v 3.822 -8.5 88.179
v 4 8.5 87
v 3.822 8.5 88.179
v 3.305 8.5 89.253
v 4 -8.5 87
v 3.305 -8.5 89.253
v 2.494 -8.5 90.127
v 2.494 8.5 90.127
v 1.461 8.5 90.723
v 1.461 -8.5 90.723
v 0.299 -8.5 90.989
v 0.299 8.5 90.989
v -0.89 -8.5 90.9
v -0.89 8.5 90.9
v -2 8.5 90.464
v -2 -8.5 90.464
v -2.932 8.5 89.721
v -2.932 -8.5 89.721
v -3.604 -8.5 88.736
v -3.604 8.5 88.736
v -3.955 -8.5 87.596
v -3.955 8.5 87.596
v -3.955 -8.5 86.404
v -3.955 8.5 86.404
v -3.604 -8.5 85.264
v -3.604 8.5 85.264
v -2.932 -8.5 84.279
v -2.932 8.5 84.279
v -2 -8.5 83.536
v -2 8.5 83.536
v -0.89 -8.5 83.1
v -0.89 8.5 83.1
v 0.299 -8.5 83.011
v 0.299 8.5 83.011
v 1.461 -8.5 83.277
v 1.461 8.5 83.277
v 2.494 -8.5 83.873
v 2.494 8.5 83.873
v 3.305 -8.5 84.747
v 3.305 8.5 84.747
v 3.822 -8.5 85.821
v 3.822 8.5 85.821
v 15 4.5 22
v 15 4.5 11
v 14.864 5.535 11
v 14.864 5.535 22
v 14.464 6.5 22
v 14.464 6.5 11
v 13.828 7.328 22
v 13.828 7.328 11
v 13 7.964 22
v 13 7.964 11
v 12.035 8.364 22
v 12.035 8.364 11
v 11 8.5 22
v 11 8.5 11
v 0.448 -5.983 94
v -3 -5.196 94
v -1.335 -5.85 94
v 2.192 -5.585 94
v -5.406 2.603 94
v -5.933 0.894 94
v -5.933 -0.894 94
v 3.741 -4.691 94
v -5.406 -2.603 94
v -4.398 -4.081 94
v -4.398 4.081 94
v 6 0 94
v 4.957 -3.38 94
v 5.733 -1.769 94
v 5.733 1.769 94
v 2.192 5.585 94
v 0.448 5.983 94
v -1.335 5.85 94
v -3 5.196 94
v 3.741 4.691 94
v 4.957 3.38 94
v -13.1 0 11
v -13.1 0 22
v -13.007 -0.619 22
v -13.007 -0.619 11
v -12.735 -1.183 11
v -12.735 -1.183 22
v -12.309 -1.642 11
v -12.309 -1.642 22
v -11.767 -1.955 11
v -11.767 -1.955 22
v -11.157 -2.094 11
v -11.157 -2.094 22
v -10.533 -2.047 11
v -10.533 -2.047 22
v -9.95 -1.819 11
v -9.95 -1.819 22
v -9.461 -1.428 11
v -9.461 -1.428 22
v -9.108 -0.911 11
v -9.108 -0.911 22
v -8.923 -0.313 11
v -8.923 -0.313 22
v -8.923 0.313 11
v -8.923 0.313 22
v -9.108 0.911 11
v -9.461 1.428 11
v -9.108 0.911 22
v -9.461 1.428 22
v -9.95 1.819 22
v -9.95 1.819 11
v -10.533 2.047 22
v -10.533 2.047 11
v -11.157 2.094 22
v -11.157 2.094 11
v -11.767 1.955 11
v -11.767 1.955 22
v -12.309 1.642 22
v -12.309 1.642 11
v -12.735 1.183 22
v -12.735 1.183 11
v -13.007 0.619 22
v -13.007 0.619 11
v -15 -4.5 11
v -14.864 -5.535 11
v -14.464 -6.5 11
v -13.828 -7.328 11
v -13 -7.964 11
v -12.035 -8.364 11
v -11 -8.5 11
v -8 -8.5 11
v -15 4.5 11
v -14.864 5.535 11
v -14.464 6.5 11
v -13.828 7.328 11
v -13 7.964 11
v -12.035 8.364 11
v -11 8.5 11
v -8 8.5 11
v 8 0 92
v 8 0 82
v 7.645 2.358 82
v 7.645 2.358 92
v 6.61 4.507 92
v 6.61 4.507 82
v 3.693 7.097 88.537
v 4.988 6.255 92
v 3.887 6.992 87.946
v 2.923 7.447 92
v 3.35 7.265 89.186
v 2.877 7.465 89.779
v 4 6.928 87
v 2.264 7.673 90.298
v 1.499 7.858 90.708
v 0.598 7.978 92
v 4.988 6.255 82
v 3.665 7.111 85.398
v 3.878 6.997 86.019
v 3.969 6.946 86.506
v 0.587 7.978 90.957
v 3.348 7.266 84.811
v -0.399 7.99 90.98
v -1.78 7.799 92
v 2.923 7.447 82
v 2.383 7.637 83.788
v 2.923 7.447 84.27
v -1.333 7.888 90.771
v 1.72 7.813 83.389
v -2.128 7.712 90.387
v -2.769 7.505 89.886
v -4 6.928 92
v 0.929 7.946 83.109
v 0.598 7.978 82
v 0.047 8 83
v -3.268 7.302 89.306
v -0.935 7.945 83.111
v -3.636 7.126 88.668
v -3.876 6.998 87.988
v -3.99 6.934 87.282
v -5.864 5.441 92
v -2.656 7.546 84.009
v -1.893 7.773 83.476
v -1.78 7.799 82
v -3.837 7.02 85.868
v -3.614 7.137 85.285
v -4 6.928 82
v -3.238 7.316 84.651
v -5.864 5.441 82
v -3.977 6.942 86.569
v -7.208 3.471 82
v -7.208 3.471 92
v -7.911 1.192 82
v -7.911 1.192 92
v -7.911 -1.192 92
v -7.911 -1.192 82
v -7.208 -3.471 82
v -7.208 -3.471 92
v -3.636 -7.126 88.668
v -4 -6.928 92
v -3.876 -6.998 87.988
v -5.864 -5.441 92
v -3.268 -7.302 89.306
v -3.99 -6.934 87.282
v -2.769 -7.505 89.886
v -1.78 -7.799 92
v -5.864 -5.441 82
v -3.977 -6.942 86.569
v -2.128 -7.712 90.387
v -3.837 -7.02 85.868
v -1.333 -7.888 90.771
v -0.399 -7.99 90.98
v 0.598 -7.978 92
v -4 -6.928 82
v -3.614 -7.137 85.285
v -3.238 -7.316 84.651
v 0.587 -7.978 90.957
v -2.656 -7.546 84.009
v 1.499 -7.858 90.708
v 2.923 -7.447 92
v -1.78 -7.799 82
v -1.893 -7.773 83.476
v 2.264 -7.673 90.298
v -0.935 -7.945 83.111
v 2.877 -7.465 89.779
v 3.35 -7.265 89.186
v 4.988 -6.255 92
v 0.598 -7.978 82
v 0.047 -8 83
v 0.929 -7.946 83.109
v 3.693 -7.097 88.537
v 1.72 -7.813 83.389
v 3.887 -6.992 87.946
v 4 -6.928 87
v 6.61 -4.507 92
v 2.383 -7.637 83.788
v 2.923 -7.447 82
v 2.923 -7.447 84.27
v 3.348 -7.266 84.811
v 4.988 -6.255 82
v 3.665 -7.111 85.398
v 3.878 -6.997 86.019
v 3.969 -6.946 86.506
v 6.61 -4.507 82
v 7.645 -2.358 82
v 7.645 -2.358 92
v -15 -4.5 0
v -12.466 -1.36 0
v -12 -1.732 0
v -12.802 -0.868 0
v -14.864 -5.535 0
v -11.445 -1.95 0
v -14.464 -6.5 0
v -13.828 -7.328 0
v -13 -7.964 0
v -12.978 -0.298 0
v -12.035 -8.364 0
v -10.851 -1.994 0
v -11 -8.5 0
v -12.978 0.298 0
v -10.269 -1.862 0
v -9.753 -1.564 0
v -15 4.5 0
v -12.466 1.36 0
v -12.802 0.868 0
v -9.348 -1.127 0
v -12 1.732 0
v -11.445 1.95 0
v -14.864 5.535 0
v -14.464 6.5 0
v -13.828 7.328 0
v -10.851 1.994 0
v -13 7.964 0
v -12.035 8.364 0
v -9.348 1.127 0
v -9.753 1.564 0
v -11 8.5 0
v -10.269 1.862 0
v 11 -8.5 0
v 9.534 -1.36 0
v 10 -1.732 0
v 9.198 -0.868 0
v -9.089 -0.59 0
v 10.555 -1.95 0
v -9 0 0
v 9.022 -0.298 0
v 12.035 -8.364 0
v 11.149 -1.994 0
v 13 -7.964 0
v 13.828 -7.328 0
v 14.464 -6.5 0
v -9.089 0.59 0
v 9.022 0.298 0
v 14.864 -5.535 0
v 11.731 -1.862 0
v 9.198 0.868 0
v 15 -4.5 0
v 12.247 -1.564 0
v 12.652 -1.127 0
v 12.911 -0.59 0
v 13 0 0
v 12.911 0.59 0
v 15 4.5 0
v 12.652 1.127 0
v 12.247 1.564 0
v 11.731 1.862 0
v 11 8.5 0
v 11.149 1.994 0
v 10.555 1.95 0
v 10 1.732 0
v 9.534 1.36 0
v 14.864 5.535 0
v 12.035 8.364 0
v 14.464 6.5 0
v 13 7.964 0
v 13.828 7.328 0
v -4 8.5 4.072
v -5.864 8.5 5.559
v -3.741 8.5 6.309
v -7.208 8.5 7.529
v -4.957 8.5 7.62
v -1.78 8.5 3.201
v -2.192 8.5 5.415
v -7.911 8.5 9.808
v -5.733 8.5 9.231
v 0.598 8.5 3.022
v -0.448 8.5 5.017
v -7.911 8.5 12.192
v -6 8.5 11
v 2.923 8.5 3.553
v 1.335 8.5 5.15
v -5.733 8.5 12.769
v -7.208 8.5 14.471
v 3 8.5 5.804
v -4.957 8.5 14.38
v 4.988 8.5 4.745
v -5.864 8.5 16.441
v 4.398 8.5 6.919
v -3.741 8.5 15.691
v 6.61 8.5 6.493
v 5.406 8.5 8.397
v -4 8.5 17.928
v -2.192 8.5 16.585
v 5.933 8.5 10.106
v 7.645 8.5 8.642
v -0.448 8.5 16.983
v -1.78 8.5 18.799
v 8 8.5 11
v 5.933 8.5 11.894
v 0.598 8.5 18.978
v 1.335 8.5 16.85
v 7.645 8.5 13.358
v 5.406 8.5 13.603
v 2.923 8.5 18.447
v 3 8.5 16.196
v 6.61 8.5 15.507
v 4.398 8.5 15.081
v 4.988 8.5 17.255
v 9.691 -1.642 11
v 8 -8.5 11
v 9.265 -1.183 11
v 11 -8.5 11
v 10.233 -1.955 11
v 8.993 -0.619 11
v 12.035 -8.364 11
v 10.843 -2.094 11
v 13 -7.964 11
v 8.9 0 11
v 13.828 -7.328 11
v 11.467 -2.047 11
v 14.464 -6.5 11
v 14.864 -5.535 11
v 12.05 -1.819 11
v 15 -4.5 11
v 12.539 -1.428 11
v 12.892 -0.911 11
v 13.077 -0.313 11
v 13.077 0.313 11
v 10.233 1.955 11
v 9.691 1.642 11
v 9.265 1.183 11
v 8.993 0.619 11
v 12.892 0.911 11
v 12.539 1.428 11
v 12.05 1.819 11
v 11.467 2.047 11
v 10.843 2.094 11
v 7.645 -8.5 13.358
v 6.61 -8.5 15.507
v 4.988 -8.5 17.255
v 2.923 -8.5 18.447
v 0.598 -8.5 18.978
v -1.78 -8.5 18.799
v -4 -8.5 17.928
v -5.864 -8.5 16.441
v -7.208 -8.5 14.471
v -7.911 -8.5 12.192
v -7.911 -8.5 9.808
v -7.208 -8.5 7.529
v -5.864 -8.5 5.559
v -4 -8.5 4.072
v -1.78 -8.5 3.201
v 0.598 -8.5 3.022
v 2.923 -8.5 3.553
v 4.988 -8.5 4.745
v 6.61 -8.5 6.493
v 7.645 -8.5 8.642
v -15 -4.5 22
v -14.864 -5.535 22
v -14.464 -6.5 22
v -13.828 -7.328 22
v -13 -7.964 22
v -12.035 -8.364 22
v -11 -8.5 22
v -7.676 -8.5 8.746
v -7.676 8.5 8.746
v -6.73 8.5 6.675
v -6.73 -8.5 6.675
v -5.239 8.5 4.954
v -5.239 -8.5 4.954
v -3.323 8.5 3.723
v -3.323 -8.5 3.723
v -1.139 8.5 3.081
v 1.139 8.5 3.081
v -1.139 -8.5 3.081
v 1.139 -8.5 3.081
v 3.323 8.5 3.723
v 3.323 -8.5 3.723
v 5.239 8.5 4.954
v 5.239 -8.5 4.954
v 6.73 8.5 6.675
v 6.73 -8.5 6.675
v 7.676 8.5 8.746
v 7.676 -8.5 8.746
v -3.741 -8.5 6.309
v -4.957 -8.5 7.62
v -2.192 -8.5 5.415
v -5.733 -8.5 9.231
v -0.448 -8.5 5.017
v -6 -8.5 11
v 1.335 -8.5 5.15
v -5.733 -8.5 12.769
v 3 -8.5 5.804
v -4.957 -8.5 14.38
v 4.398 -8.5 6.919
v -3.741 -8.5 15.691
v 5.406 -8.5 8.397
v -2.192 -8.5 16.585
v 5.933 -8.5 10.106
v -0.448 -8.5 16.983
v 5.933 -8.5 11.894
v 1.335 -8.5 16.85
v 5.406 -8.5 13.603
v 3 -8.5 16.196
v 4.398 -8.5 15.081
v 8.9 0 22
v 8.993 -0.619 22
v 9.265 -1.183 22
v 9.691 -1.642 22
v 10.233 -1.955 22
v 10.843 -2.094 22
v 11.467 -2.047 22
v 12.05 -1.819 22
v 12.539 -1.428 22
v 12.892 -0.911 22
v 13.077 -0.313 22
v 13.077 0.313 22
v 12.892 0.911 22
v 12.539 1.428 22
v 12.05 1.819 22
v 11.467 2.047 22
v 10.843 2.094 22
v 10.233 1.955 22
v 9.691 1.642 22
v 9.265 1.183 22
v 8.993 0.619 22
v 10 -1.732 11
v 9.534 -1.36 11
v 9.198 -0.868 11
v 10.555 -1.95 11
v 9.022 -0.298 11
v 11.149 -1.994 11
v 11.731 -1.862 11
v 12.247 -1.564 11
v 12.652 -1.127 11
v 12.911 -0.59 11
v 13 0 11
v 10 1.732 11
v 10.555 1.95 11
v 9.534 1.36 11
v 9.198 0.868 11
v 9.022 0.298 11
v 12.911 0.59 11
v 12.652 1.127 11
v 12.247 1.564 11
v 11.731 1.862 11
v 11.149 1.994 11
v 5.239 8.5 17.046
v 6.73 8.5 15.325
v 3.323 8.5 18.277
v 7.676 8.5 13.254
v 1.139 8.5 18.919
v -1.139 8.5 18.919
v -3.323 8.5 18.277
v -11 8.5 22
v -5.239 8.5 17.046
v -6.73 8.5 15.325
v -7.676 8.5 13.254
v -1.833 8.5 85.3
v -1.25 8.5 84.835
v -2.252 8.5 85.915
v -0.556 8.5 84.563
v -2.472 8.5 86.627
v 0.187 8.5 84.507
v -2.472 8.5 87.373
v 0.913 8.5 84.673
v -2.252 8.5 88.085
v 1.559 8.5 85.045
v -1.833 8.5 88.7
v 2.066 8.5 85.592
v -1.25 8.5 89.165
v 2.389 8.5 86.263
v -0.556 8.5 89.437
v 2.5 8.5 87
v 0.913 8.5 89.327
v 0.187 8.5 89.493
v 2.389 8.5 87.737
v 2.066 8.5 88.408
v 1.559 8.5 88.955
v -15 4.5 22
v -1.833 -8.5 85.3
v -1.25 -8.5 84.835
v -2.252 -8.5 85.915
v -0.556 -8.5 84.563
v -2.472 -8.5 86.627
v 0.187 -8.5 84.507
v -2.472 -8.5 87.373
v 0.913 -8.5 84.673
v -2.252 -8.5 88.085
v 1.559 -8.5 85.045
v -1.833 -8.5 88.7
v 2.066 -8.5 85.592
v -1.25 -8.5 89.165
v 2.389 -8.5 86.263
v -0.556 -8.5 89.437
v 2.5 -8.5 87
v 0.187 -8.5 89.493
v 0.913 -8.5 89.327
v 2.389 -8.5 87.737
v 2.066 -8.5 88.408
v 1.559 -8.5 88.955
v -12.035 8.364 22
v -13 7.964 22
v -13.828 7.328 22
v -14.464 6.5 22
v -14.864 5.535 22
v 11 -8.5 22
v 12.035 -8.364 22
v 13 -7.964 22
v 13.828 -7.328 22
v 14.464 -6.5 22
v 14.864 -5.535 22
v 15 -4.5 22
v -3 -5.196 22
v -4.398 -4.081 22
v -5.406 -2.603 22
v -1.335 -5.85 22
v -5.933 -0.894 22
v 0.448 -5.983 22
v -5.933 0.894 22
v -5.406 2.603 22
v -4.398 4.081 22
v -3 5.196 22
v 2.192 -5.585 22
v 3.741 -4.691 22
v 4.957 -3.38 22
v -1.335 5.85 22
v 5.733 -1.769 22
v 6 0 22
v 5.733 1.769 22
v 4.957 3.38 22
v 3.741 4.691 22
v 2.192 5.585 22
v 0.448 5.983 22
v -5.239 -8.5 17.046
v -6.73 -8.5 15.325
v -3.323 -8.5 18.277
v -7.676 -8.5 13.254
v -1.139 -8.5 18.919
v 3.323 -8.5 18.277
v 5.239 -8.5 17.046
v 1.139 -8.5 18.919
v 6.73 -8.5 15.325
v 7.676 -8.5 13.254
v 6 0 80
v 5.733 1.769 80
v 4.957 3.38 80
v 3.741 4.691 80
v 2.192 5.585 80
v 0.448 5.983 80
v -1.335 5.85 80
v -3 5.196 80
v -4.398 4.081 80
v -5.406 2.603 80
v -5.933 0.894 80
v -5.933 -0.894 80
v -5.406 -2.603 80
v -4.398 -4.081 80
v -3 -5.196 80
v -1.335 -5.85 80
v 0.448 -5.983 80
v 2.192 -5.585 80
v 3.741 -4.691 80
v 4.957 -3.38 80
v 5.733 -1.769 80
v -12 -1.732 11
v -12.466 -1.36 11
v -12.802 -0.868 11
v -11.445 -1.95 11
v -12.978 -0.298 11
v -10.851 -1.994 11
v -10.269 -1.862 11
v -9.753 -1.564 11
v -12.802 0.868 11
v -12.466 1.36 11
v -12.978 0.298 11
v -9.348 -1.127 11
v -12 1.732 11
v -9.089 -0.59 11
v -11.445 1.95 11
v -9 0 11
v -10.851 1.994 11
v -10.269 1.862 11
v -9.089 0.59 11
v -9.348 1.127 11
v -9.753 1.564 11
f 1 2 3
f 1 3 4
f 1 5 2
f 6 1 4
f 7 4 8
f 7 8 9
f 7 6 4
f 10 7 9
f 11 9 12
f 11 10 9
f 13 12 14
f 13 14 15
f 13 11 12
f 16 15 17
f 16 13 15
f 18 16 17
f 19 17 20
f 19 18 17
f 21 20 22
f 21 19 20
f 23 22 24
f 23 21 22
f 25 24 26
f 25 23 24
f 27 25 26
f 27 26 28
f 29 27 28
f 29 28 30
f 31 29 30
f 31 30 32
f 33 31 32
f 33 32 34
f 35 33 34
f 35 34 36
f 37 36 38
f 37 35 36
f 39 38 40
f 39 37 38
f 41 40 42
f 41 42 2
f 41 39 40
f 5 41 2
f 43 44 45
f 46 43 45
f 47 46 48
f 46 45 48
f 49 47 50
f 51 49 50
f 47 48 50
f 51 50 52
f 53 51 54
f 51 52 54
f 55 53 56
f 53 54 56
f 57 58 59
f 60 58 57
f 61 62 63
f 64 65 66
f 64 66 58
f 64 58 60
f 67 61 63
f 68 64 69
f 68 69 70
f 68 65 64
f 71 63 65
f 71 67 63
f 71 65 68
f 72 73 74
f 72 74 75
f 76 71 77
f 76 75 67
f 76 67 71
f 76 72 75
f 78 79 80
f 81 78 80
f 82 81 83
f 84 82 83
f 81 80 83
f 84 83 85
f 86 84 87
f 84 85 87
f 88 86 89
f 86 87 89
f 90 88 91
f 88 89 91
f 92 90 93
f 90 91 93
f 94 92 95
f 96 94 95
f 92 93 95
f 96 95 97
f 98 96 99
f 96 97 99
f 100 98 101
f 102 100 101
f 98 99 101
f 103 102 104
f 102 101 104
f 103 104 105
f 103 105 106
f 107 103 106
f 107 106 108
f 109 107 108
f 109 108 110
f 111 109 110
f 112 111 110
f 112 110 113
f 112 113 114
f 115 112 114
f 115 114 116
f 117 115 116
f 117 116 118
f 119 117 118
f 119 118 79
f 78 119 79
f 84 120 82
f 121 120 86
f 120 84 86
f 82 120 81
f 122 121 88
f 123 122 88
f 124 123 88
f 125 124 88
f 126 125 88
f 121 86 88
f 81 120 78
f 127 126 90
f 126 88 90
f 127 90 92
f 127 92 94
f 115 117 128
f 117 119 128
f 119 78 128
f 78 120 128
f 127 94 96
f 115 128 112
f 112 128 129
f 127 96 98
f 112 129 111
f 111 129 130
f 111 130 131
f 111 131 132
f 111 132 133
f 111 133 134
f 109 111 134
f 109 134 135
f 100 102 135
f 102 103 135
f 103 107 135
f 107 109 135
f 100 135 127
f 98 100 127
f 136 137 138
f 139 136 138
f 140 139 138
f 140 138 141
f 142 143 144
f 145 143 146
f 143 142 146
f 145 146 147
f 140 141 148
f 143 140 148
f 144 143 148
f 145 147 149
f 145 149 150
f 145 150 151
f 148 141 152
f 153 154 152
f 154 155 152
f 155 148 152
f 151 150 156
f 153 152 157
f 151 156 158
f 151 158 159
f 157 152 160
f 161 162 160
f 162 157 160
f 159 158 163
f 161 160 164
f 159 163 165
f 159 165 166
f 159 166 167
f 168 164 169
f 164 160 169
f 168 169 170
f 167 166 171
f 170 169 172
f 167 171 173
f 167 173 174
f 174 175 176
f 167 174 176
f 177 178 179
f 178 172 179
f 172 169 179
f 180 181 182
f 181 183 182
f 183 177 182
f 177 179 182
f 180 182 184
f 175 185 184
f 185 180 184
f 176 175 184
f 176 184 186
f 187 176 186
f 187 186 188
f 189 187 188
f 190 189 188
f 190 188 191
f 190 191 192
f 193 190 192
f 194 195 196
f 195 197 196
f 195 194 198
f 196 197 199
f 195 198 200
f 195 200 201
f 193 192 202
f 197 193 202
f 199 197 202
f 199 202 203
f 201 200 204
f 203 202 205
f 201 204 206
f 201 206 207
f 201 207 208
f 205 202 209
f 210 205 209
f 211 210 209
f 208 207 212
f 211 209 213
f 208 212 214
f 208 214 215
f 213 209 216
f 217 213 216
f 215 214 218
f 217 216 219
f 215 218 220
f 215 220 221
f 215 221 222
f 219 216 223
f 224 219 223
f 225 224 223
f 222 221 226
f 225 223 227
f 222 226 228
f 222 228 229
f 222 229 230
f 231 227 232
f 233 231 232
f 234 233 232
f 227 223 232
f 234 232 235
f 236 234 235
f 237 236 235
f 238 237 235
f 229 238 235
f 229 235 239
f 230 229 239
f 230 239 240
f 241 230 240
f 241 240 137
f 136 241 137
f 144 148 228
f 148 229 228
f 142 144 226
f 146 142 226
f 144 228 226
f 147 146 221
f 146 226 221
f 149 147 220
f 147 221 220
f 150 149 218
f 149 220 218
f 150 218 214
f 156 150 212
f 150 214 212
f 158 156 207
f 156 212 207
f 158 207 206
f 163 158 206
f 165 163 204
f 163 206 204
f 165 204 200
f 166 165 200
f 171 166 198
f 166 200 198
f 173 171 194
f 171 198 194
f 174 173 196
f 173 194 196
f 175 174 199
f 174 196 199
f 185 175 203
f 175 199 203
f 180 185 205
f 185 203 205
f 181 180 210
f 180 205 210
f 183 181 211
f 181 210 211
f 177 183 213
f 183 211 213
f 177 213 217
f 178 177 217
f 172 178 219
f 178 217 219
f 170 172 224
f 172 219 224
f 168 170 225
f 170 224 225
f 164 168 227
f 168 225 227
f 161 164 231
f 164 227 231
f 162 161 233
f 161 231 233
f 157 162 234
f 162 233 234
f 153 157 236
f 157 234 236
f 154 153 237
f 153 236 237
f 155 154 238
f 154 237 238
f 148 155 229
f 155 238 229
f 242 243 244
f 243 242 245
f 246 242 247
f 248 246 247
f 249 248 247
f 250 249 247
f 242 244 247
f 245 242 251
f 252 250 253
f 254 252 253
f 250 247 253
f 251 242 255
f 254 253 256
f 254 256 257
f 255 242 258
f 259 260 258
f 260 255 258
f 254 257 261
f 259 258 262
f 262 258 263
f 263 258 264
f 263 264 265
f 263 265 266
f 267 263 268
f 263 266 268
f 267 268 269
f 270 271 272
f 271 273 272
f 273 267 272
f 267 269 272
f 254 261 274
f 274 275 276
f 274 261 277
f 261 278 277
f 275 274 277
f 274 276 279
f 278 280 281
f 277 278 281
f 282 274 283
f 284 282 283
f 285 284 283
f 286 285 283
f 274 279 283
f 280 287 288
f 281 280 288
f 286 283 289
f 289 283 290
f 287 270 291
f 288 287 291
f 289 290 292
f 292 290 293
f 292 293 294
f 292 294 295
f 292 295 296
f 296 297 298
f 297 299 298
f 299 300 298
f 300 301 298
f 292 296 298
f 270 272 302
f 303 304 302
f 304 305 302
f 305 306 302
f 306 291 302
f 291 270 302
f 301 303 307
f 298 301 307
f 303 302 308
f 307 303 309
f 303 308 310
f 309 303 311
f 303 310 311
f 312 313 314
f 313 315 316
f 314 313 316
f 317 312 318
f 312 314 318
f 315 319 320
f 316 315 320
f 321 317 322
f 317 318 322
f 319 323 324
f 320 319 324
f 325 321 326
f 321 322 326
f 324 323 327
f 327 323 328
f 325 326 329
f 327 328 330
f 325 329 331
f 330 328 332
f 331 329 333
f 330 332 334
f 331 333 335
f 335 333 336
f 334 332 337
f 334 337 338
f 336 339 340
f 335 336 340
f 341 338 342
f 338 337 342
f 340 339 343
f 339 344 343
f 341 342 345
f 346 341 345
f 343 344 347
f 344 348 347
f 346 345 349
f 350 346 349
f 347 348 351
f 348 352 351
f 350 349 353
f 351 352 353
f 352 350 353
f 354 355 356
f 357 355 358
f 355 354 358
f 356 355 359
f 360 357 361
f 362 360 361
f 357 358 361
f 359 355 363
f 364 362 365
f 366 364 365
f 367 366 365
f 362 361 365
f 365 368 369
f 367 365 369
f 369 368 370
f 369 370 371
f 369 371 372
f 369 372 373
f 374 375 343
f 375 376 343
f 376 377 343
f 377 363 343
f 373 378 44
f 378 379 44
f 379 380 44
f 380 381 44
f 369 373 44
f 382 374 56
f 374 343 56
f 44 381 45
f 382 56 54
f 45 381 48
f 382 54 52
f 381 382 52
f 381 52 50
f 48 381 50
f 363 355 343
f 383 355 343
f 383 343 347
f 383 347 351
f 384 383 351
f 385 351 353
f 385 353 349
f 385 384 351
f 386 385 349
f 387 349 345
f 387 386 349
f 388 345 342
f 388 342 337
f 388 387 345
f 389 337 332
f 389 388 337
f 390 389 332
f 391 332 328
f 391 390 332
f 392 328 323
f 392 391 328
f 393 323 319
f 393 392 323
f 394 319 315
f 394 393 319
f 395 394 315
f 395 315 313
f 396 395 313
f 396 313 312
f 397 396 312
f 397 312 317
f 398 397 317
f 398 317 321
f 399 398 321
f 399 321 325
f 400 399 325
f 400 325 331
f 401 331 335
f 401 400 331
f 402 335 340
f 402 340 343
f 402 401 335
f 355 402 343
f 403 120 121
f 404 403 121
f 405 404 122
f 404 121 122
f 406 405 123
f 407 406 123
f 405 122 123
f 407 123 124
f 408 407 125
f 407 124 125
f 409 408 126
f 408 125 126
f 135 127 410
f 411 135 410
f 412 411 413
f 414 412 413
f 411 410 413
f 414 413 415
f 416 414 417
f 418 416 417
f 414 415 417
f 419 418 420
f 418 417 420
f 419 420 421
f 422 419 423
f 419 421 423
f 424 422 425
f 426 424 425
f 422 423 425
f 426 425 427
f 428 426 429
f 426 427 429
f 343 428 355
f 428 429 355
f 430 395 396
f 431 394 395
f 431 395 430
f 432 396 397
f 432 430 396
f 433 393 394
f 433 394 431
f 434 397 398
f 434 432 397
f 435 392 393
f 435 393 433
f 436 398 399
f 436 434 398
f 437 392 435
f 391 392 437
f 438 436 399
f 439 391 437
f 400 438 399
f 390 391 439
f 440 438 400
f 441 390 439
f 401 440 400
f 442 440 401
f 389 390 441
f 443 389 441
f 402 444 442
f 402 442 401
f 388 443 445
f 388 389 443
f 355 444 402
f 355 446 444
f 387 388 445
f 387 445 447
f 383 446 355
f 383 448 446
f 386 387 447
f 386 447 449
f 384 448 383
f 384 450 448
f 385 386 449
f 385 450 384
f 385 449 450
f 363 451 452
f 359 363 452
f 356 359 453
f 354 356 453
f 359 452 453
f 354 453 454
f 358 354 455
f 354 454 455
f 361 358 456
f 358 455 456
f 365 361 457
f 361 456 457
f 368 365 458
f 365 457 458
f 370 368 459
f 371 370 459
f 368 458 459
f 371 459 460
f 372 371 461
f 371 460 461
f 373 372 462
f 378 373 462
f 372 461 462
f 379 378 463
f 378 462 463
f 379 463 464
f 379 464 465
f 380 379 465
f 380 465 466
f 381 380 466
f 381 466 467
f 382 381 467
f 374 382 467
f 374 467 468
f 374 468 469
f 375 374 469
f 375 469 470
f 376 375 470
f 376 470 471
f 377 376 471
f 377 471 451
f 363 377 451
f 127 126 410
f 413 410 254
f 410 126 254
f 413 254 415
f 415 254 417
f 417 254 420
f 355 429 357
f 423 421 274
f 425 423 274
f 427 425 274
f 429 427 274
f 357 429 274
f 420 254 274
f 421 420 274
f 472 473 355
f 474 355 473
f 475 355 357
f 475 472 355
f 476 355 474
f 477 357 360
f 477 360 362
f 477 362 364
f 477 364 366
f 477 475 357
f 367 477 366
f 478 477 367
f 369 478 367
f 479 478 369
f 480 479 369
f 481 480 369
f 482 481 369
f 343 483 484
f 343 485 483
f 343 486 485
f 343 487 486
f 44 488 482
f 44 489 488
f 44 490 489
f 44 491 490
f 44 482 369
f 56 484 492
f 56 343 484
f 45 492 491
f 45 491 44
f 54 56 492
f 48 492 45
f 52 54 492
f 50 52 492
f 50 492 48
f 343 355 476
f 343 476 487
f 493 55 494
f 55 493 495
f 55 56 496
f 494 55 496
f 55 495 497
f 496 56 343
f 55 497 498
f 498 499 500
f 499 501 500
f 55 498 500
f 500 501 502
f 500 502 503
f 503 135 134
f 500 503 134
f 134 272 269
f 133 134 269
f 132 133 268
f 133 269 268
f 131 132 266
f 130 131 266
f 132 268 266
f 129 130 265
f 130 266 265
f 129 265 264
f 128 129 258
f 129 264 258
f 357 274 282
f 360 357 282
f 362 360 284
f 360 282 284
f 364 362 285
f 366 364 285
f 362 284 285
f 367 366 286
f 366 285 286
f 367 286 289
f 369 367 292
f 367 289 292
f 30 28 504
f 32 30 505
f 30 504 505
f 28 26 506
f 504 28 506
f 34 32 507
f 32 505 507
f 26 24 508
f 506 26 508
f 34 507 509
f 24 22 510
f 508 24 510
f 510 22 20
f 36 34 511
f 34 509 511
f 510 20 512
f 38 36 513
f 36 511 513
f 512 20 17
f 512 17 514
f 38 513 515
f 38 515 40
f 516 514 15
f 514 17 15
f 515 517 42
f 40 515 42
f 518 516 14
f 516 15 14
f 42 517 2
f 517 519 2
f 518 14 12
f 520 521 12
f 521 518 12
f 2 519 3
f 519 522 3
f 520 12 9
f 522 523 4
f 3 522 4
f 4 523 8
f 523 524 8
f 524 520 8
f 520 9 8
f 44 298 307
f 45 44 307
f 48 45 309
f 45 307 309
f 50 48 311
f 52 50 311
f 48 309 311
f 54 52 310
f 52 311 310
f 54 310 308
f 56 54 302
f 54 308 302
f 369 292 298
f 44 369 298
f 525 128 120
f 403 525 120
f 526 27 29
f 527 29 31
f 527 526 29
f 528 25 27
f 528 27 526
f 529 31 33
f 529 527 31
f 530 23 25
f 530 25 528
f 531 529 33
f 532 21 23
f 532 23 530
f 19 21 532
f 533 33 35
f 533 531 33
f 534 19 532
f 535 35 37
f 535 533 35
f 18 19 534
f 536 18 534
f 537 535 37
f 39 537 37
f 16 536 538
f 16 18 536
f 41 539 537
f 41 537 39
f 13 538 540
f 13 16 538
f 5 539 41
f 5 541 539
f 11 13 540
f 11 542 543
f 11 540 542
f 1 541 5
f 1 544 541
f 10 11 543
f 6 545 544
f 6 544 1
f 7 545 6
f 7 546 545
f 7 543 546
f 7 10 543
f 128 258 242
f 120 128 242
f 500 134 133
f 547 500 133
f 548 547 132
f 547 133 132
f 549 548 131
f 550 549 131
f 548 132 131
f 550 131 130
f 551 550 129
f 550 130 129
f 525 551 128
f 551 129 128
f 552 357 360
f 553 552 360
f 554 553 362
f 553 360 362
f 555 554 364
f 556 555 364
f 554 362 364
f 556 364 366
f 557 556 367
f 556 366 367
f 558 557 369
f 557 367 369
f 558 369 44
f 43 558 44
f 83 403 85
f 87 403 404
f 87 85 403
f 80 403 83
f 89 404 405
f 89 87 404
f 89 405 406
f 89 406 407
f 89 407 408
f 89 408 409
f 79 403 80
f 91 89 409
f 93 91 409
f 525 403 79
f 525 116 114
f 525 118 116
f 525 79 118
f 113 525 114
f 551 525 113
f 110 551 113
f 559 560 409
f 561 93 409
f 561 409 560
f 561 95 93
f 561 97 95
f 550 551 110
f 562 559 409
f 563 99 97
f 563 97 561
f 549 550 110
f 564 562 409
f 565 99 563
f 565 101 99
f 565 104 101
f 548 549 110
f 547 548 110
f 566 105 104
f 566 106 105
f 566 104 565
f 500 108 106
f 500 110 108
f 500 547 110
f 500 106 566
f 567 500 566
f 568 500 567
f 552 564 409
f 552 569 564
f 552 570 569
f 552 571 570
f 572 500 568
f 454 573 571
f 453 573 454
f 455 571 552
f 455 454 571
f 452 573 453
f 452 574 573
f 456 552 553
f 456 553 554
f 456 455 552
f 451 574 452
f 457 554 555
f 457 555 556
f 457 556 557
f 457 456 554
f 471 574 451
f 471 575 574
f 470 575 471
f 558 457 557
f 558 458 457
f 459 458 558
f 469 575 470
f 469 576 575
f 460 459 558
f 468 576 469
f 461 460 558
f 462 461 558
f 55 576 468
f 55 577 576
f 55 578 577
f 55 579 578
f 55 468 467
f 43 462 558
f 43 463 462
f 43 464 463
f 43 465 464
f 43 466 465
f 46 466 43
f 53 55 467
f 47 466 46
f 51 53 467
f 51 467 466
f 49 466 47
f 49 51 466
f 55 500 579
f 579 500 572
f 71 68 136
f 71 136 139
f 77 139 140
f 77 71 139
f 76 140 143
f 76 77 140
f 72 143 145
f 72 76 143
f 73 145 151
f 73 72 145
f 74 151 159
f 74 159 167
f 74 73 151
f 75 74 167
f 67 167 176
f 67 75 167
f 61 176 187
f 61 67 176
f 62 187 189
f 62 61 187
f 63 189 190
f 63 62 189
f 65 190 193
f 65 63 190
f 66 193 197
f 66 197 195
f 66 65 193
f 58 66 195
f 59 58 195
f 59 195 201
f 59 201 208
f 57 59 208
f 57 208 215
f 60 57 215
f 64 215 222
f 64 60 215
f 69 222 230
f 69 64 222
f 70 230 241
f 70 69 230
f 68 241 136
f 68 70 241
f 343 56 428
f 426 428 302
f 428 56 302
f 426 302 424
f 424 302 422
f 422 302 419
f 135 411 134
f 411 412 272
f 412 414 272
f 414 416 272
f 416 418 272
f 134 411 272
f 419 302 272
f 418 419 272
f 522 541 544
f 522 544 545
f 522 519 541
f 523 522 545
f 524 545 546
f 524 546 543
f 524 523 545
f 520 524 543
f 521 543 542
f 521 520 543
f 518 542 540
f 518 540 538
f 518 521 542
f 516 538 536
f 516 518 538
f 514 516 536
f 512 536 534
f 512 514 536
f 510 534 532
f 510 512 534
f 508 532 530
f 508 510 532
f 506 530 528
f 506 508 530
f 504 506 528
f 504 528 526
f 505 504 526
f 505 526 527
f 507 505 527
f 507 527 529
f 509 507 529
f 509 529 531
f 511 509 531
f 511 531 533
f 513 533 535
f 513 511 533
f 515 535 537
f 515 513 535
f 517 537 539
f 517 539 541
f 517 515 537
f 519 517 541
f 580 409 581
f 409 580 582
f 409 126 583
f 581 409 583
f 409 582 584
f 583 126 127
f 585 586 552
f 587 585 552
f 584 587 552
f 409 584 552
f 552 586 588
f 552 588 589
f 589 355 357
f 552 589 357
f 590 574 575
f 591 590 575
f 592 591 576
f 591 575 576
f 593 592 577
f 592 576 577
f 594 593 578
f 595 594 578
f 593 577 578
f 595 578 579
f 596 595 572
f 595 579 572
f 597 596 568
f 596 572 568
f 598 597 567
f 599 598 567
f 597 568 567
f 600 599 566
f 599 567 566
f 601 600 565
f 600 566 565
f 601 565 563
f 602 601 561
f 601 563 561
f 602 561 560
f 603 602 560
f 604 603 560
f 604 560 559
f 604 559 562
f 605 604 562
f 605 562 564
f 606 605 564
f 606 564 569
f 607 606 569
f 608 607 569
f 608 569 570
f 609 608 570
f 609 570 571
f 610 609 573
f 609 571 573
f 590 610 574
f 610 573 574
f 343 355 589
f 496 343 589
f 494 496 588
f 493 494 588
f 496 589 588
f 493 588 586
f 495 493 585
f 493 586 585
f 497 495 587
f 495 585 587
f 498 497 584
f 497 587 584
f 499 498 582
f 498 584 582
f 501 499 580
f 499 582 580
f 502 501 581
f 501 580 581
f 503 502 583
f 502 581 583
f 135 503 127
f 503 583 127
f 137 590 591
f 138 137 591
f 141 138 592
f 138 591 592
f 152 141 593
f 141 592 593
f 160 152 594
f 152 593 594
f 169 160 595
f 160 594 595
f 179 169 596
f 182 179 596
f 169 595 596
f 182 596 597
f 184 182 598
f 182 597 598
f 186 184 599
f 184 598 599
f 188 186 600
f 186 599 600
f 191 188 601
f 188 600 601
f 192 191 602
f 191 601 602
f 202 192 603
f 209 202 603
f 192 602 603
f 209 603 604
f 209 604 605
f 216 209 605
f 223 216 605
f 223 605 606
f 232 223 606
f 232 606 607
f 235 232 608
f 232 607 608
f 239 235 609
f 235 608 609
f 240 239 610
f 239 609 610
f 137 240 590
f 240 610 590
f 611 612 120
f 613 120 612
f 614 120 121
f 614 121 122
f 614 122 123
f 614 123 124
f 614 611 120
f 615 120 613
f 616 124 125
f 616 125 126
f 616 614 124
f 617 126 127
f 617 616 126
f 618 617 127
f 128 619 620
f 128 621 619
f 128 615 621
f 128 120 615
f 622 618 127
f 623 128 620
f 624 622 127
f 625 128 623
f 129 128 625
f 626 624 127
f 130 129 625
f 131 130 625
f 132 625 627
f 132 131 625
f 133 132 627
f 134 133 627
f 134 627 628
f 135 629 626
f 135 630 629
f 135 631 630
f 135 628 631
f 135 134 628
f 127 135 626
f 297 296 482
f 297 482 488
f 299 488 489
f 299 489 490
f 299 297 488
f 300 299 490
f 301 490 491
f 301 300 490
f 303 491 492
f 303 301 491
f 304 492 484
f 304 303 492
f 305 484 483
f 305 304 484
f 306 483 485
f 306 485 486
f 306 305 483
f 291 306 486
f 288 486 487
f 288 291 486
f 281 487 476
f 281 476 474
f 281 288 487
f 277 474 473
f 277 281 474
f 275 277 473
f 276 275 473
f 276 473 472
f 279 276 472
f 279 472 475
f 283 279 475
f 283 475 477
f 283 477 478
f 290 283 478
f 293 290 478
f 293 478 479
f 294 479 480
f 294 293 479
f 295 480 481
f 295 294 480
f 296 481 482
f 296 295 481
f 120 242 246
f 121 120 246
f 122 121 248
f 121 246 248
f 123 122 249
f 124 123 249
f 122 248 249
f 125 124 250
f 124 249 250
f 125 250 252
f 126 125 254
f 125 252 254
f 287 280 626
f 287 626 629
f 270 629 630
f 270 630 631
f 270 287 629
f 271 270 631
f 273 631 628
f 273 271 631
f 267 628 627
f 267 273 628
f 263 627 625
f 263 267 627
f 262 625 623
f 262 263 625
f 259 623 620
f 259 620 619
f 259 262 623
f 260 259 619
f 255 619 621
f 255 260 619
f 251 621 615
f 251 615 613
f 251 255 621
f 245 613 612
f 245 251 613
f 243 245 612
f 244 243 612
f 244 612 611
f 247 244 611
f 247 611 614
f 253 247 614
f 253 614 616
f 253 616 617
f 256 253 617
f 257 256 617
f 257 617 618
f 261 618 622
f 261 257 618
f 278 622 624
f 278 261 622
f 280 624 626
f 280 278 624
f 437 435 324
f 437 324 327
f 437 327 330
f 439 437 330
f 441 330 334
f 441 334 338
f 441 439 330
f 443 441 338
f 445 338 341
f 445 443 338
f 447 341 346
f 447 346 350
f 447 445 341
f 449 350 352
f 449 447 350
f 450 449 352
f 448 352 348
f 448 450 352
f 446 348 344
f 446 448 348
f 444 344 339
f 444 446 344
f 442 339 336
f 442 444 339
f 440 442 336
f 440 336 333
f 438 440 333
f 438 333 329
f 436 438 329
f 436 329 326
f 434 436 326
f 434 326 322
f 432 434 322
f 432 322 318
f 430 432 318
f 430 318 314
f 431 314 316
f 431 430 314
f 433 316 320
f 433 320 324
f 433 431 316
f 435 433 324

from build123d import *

# Parameters (mm, degrees)
F0_R           = 2
F1_DEPTH       = 11
F2_R           = 2
F3_DEPTH       = 11
F4_D           = 4.2
F5_R           = 6
F6_DEPTH       = 58
F7_R           = 8
F7_R_2         = 6
F8_DEPTH       = 14
F9_SIZE        = 1.99999
F11_DEPTH      = 17.001
F12_DEPTH      = 17
F13_R          = 4
F13_R_2        = 2.5
F14_DEPTH      = 8.501
F14_DEPTH_BACK = 8.501
F15_DEPTH      = 8.5


# Not quite as in the source:
# - a fillet or chamfer is up to 0.001 mm smaller than in the source, because OpenCascade refuses the exact size


with BuildPart() as f1:
    # F0 (on Top) → F1 (new body)
    with BuildSketch(Plane.XY):
        with BuildLine():
            Line((-11, -8.5), (11, -8.5))
            ThreePointArc((11, -8.5), (13.8284271247, -7.3284271247), (15, -4.5))
            Line((15, -4.5), (15, 4.5))
            ThreePointArc((15, 4.5), (13.8284271247, 7.3284271247), (11, 8.5))
            Line((11, 8.5), (-11, 8.5))
            ThreePointArc((-11, 8.5), (-13.8284271247, 7.3284271247), (-15, 4.5))
            Line((-15, 4.5), (-15, -4.5))
            ThreePointArc((-15, -4.5), (-13.8284271247, -7.3284271247), (-11, -8.5))
        make_face()
        with Locations((-11, 0)):
            Circle(F0_R, mode=Mode.SUBTRACT)
        with Locations((11, 0)):
            Circle(F0_R, mode=Mode.SUBTRACT)
    extrude(amount=F1_DEPTH)


with BuildPart() as f3:
    # F2 (on face) → F3 (new body)
    with BuildSketch(Plane.XY.offset(11)):
        with BuildLine():
            ThreePointArc((-15, -4.5), (-13.8284271247, -7.3284271247), (-11, -8.5))
            Line((-11, -8.5), (11, -8.5))
            ThreePointArc((11, -8.5), (13.8284271247, -7.3284271247), (15, -4.5))
            Line((15, -4.5), (15, 4.5))
            ThreePointArc((15, 4.5), (13.8284271247, 7.3284271247), (11, 8.5))
            Line((11, 8.5), (-11, 8.5))
            ThreePointArc((-11, 8.5), (-13.8284271247, 7.3284271247), (-15, 4.5))
            Line((-15, 4.5), (-15, -4.5))
        make_face()
        with Locations((-11, 0)):
            Circle(F2_R, mode=Mode.SUBTRACT)
        with Locations((11, 0)):
            Circle(F2_R, mode=Mode.SUBTRACT)
        with Locations((-11, 0)):
            Circle(F2_R)
        with Locations((11, 0)):
            Circle(F2_R)
    extrude(amount=F3_DEPTH)

    # F4 (through all)
    with Locations(Plane(origin=(0, 0, 11), x_dir=(1, 0, 0), z_dir=(0, 0, -1))):
        with Locations((-11, 0), (11, 0)):
            Hole(F4_D / 2)

    # F5 (on face) → F6 (join)
    with BuildSketch(Plane.XY.offset(22)):
        Circle(F5_R)
    extrude(amount=F6_DEPTH)

    # F7 (on face) → F8 (join)
    with BuildSketch(Plane.XY.offset(80)):
        Circle(F7_R)
        Circle(F7_R_2, mode=Mode.SUBTRACT)
        Circle(F7_R_2)
    extrude(amount=F8_DEPTH)

    # F9 (size 2 in the source; OpenCascade refuses exactly that, so slightly less here)
    f9_edges = [f3.edges().sort_by_distance(p)[0] for p in [
        (-8, 0, 80),
        (-8, 0, 94),
    ]]
    chamfer(f9_edges, length=F9_SIZE)


with BuildPart() as f11_tool:
    # F10 (on face) → F11 (new body, through all)
    with BuildSketch(Plane.XZ.offset(8.5)):
        with BuildLine():
            Line((-6, 11), (6, 11))
            ThreePointArc((6, 11), (0, 17), (-6, 11))
        make_face()
        with BuildLine():
            ThreePointArc((-6, 11), (0, 17), (6, 11))
            Line((6, 11), (8, 11))
            ThreePointArc((8, 11), (0, 19), (-8, 11))
            Line((-8, 11), (-6, 11))
        make_face()
        with BuildLine():
            Line((8, 11), (6, 11))
            ThreePointArc((6, 11), (0, 5), (-6, 11))
            Line((-6, 11), (-8, 11))
            ThreePointArc((-8, 11), (0, 3), (8, 11))
        make_face()
        with BuildLine():
            ThreePointArc((-6, 11), (0, 5), (6, 11))
            Line((6, 11), (-6, 11))
        make_face()
    extrude(amount=-F11_DEPTH)


with BuildPart() as f1_1:
    add(f1.part)

    # F11: cut by f11_tool
    add(f11_tool.part, mode=Mode.SUBTRACT)


with BuildPart() as f3_1:
    add(f3.part)

    # F11: cut by f11_tool
    add(f11_tool.part, mode=Mode.SUBTRACT)

    # F13 (on Front) → F14 (cut, two sides)
    with BuildSketch(Plane.XZ) as f14_sk:
        with Locations((0, 87)):
            Circle(F13_R)
        with Locations((0, 87)):
            Circle(F13_R_2, mode=Mode.SUBTRACT)
        with Locations((0, 87)):
            Circle(F13_R_2)
    extrude(amount=-F14_DEPTH, mode=Mode.SUBTRACT)
    extrude(f14_sk.sketch, amount=F14_DEPTH_BACK, mode=Mode.SUBTRACT)


with BuildPart() as f12:
    # F10 (on face) → F12 (new body)
    with BuildSketch(Plane.XZ.offset(8.5)):
        with BuildLine():
            Line((8, 11), (6, 11))
            ThreePointArc((6, 11), (0, 5), (-6, 11))
            Line((-6, 11), (-8, 11))
            ThreePointArc((-8, 11), (0, 3), (8, 11))
        make_face()
        with BuildLine():
            ThreePointArc((-6, 11), (0, 17), (6, 11))
            Line((6, 11), (8, 11))
            ThreePointArc((8, 11), (0, 19), (-8, 11))
            Line((-8, 11), (-6, 11))
        make_face()
    extrude(amount=-F12_DEPTH)


with BuildPart() as f15:
    # F13 (on Front) → F15 (new body, symmetric)
    with BuildSketch(Plane.XZ):
        with Locations((0, 87)):
            Circle(F13_R)
        with Locations((0, 87)):
            Circle(F13_R_2, mode=Mode.SUBTRACT)
    extrude(amount=F15_DEPTH, both=True)


solid = Compound([f1_1.part, f3_1.part, f12.part, f15.part])
